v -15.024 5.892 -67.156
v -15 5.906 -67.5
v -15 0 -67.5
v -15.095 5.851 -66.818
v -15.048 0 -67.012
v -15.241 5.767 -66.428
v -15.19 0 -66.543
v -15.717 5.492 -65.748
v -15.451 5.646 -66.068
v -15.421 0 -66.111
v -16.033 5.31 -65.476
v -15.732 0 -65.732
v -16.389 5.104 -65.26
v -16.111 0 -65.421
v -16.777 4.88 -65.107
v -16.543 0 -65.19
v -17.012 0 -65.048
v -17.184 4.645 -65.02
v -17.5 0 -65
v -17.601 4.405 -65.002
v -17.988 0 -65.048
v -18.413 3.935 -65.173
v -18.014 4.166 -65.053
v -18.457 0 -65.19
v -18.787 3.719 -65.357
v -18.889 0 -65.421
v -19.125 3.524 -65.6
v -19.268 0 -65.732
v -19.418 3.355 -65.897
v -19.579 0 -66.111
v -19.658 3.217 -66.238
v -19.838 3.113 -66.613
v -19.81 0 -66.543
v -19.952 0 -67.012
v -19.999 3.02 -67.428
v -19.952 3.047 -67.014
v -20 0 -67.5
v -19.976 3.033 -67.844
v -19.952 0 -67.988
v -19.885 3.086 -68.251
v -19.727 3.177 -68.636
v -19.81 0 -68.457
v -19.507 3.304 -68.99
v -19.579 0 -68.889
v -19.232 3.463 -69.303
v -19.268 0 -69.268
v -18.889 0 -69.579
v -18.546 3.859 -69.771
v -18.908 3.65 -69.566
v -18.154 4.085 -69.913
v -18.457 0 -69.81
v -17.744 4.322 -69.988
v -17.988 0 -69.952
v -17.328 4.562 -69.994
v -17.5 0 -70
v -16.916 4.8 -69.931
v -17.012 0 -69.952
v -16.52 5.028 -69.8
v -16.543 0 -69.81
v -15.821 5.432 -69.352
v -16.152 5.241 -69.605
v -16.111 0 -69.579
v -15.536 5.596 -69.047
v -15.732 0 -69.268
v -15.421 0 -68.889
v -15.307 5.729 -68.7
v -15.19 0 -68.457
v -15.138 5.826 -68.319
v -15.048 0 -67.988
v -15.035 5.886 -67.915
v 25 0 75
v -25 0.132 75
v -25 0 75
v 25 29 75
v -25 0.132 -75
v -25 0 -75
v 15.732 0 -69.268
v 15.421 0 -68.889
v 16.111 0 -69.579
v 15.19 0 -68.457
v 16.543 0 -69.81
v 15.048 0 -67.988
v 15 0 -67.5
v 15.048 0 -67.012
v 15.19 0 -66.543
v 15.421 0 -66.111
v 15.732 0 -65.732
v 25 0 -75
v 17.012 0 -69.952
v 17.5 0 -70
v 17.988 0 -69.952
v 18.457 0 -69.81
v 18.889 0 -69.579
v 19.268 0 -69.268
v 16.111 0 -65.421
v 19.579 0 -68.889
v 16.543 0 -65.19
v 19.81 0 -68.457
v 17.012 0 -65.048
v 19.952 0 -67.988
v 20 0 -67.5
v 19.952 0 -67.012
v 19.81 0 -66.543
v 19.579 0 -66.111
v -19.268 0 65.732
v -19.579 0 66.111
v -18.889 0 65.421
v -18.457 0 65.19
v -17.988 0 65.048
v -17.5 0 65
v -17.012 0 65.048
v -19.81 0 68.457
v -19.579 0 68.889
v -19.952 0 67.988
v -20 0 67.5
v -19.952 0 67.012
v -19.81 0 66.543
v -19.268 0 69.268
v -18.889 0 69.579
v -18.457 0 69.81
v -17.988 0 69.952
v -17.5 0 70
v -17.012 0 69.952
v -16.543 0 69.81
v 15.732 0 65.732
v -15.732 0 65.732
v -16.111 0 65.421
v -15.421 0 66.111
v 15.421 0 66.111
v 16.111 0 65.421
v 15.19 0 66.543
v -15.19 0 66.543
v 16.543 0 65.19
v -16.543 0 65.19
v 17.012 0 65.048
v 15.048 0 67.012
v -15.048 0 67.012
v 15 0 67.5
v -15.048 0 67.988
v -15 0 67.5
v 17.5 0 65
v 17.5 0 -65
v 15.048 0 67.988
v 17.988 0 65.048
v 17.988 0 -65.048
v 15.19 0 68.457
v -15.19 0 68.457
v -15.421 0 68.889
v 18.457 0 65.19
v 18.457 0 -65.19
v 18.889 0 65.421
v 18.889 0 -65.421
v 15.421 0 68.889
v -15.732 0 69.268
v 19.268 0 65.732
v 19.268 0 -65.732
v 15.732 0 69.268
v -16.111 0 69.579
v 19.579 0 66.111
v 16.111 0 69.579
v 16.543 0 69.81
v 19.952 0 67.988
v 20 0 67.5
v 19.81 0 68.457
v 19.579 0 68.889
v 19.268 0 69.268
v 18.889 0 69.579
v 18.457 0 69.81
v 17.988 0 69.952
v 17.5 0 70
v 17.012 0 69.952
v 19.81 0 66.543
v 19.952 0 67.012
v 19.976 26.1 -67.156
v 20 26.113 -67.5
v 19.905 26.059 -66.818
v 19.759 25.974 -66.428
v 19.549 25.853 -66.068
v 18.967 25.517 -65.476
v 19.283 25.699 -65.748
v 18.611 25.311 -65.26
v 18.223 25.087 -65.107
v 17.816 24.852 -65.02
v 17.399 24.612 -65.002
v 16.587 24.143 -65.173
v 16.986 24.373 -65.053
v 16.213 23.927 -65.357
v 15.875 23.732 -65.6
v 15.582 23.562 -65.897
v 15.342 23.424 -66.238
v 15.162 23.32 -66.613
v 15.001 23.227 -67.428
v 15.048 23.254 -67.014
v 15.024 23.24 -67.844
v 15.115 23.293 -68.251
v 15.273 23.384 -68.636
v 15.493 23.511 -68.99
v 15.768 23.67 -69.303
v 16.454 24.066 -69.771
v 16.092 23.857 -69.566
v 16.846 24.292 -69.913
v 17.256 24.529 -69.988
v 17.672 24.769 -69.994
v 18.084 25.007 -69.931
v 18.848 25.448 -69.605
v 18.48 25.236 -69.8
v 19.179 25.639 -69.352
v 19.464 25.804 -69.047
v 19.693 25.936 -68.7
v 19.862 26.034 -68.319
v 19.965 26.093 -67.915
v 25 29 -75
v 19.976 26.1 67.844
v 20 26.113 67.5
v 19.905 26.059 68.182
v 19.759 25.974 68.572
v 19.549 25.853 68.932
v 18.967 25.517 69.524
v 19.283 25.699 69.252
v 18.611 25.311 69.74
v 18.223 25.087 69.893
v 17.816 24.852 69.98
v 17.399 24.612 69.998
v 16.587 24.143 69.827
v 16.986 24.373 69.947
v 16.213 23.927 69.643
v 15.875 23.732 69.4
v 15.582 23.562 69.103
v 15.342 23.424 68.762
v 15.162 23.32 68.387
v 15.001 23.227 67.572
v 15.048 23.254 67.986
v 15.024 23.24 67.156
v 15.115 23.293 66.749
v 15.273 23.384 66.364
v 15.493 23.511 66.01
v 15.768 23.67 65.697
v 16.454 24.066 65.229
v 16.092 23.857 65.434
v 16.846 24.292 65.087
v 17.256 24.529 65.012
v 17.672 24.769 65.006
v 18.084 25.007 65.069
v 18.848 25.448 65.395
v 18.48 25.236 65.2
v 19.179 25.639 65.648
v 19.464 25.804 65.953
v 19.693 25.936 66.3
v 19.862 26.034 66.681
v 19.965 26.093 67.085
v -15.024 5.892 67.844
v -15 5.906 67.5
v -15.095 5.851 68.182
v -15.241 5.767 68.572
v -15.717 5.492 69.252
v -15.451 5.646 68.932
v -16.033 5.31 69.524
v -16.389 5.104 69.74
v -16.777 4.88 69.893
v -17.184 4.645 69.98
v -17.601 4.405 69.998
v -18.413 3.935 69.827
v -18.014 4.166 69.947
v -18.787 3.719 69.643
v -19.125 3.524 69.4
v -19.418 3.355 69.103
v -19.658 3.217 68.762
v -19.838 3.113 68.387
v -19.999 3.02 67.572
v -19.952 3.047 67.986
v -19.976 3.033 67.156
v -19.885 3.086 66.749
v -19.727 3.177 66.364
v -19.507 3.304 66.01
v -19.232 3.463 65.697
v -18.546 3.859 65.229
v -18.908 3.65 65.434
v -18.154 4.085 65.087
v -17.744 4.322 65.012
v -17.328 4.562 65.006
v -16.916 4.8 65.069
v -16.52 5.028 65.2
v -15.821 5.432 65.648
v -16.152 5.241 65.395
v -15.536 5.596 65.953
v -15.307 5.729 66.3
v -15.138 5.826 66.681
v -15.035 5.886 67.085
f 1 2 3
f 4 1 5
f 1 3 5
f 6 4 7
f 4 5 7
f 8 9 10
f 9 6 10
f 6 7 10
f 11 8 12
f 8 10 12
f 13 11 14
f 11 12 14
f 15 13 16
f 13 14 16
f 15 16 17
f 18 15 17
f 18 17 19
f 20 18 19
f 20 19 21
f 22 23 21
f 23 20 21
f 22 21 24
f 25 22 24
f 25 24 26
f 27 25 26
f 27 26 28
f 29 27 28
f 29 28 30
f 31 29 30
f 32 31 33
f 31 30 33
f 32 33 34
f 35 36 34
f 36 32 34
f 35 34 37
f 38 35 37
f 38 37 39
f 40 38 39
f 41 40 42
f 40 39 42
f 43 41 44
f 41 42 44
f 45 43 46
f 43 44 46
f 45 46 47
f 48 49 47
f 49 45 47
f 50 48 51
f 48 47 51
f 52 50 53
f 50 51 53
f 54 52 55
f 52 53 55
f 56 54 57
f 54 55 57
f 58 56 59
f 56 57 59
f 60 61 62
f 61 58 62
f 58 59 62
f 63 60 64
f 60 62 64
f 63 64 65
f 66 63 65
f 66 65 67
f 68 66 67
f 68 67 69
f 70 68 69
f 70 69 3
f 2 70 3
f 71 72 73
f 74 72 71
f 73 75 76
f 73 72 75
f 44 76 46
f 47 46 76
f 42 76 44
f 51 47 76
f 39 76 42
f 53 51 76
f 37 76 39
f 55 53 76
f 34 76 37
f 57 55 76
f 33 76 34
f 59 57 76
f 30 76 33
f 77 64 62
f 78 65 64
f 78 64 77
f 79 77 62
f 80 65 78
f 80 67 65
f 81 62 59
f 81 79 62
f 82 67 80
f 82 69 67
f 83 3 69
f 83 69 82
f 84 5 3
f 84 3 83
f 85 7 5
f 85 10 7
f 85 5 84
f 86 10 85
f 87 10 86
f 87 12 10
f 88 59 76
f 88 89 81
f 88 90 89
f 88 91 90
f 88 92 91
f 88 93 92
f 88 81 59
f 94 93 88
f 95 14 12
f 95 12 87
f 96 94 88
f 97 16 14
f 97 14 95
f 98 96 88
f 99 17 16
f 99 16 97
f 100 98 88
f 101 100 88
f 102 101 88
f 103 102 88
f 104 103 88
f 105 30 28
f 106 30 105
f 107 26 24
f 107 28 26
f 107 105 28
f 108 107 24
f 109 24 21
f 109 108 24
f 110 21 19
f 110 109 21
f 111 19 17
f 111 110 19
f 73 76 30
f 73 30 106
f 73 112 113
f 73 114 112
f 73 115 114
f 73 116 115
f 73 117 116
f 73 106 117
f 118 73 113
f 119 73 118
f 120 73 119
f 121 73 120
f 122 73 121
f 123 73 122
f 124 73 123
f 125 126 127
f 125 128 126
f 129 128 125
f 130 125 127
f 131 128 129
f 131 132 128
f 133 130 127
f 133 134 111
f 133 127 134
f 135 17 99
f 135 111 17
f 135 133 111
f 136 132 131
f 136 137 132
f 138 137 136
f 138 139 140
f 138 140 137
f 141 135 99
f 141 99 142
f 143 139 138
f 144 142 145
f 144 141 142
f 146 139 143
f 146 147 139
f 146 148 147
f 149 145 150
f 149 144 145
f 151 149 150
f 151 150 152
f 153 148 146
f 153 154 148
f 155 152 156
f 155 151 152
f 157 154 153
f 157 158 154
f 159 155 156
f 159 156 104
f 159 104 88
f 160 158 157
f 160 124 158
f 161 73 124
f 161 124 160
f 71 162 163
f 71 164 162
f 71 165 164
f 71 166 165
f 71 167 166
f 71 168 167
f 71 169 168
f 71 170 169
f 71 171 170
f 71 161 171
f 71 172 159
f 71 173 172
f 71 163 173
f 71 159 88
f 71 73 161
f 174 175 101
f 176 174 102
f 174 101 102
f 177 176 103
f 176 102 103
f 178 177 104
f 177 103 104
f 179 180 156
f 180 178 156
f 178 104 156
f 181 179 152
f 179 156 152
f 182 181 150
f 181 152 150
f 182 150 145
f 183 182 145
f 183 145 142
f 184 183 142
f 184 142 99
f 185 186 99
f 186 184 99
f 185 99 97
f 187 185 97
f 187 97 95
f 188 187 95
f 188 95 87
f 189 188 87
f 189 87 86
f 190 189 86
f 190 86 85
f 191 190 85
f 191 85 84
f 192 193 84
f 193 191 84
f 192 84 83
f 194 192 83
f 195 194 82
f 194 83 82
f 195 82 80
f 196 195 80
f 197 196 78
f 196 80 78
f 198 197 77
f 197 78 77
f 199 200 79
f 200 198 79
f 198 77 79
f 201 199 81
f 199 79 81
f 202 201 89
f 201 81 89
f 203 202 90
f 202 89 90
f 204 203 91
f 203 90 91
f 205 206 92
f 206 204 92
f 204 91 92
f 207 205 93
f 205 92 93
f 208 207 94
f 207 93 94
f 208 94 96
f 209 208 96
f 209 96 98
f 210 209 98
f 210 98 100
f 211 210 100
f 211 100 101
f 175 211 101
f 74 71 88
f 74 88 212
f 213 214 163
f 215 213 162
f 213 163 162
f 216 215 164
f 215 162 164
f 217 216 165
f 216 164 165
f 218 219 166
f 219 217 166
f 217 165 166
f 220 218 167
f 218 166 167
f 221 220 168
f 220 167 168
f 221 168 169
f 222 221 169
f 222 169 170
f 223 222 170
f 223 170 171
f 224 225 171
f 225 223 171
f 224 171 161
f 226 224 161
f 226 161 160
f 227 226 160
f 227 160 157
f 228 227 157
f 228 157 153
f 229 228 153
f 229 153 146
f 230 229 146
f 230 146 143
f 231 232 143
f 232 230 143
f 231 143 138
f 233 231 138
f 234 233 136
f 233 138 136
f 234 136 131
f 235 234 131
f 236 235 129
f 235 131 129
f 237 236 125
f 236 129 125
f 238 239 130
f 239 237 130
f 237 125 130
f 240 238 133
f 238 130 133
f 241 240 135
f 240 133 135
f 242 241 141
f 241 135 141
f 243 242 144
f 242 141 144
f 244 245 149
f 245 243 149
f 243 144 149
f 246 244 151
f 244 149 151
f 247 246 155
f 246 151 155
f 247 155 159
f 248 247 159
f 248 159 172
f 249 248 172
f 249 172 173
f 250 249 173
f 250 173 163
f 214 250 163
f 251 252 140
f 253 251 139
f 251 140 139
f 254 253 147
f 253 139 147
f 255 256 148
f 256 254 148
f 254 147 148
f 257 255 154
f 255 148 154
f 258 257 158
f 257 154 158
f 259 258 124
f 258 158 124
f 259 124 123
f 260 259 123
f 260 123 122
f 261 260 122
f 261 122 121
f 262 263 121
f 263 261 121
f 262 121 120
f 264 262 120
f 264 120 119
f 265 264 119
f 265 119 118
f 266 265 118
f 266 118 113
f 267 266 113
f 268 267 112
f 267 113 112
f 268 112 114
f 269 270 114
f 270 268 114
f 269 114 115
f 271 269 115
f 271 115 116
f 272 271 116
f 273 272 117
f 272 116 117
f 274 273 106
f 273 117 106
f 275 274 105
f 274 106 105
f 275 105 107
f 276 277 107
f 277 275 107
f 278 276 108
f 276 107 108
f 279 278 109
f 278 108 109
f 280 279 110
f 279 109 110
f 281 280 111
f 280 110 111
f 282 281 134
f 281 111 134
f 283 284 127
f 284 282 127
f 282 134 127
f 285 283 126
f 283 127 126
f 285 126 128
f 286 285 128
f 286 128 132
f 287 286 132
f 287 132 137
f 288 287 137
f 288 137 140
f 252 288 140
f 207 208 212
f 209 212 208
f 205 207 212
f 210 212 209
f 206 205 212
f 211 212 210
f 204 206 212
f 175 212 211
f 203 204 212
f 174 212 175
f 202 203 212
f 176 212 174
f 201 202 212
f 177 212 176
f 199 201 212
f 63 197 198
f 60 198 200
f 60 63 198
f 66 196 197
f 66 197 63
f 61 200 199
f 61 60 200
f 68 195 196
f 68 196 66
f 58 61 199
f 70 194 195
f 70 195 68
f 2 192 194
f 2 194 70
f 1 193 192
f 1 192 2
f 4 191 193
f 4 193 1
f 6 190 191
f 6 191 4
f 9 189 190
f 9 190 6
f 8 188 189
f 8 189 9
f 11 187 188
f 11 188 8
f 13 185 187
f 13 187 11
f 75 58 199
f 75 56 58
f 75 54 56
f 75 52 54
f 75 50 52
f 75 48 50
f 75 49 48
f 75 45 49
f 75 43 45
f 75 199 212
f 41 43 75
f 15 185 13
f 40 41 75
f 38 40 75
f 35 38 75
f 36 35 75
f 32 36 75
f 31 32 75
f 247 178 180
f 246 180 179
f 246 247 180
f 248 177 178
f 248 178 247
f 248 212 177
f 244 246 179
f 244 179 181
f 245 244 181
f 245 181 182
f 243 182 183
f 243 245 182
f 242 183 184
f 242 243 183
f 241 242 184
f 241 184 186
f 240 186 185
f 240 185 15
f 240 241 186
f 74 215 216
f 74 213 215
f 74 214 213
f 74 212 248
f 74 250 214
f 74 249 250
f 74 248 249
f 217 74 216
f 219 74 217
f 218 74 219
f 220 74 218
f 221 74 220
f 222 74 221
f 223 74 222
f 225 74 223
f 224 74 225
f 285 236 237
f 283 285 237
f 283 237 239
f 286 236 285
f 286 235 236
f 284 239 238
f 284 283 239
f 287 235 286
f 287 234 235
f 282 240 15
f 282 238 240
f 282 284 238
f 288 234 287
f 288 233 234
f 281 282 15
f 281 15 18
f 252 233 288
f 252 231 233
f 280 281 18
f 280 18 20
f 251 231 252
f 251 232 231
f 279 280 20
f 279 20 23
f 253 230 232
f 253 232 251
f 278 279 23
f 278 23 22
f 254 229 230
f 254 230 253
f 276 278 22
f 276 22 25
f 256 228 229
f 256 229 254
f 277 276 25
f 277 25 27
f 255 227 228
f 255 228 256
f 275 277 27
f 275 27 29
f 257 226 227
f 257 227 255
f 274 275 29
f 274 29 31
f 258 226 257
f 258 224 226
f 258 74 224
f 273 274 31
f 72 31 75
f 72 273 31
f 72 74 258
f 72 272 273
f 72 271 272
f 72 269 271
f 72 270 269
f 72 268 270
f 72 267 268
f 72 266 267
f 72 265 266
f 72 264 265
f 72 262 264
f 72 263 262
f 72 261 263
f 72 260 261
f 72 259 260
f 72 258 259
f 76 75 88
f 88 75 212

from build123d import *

# Parameters (mm, degrees)
BOSS_EXTRUDE1_DEPTH = 75
SKETCH3_R           = 2.5
CUT_EXTRUDE1_DEPTH  = 50


with BuildPart() as part:
    # Sketch2 → Boss-Extrude1 (new body, symmetric)
    with BuildSketch(Plane.XY):
        Polygon((-25, 0), (25, 0), (25, 29), (-25, 0.132486541), align=None)
    extrude(amount=BOSS_EXTRUDE1_DEPTH, both=True)

    # Sketch3 → Cut-Extrude1 (cut)
    with BuildSketch(Plane.XZ):
        with Locations((-17.5, 67.5)):
            Circle(SKETCH3_R)
        with Locations((17.5, 67.5)):
            Circle(SKETCH3_R)
        with Locations((-17.5, -67.5)):
            Circle(SKETCH3_R)
        with Locations((17.5, -67.5)):
            Circle(SKETCH3_R)
    extrude(amount=-CUT_EXTRUDE1_DEPTH, mode=Mode.SUBTRACT)


solid = part.part
